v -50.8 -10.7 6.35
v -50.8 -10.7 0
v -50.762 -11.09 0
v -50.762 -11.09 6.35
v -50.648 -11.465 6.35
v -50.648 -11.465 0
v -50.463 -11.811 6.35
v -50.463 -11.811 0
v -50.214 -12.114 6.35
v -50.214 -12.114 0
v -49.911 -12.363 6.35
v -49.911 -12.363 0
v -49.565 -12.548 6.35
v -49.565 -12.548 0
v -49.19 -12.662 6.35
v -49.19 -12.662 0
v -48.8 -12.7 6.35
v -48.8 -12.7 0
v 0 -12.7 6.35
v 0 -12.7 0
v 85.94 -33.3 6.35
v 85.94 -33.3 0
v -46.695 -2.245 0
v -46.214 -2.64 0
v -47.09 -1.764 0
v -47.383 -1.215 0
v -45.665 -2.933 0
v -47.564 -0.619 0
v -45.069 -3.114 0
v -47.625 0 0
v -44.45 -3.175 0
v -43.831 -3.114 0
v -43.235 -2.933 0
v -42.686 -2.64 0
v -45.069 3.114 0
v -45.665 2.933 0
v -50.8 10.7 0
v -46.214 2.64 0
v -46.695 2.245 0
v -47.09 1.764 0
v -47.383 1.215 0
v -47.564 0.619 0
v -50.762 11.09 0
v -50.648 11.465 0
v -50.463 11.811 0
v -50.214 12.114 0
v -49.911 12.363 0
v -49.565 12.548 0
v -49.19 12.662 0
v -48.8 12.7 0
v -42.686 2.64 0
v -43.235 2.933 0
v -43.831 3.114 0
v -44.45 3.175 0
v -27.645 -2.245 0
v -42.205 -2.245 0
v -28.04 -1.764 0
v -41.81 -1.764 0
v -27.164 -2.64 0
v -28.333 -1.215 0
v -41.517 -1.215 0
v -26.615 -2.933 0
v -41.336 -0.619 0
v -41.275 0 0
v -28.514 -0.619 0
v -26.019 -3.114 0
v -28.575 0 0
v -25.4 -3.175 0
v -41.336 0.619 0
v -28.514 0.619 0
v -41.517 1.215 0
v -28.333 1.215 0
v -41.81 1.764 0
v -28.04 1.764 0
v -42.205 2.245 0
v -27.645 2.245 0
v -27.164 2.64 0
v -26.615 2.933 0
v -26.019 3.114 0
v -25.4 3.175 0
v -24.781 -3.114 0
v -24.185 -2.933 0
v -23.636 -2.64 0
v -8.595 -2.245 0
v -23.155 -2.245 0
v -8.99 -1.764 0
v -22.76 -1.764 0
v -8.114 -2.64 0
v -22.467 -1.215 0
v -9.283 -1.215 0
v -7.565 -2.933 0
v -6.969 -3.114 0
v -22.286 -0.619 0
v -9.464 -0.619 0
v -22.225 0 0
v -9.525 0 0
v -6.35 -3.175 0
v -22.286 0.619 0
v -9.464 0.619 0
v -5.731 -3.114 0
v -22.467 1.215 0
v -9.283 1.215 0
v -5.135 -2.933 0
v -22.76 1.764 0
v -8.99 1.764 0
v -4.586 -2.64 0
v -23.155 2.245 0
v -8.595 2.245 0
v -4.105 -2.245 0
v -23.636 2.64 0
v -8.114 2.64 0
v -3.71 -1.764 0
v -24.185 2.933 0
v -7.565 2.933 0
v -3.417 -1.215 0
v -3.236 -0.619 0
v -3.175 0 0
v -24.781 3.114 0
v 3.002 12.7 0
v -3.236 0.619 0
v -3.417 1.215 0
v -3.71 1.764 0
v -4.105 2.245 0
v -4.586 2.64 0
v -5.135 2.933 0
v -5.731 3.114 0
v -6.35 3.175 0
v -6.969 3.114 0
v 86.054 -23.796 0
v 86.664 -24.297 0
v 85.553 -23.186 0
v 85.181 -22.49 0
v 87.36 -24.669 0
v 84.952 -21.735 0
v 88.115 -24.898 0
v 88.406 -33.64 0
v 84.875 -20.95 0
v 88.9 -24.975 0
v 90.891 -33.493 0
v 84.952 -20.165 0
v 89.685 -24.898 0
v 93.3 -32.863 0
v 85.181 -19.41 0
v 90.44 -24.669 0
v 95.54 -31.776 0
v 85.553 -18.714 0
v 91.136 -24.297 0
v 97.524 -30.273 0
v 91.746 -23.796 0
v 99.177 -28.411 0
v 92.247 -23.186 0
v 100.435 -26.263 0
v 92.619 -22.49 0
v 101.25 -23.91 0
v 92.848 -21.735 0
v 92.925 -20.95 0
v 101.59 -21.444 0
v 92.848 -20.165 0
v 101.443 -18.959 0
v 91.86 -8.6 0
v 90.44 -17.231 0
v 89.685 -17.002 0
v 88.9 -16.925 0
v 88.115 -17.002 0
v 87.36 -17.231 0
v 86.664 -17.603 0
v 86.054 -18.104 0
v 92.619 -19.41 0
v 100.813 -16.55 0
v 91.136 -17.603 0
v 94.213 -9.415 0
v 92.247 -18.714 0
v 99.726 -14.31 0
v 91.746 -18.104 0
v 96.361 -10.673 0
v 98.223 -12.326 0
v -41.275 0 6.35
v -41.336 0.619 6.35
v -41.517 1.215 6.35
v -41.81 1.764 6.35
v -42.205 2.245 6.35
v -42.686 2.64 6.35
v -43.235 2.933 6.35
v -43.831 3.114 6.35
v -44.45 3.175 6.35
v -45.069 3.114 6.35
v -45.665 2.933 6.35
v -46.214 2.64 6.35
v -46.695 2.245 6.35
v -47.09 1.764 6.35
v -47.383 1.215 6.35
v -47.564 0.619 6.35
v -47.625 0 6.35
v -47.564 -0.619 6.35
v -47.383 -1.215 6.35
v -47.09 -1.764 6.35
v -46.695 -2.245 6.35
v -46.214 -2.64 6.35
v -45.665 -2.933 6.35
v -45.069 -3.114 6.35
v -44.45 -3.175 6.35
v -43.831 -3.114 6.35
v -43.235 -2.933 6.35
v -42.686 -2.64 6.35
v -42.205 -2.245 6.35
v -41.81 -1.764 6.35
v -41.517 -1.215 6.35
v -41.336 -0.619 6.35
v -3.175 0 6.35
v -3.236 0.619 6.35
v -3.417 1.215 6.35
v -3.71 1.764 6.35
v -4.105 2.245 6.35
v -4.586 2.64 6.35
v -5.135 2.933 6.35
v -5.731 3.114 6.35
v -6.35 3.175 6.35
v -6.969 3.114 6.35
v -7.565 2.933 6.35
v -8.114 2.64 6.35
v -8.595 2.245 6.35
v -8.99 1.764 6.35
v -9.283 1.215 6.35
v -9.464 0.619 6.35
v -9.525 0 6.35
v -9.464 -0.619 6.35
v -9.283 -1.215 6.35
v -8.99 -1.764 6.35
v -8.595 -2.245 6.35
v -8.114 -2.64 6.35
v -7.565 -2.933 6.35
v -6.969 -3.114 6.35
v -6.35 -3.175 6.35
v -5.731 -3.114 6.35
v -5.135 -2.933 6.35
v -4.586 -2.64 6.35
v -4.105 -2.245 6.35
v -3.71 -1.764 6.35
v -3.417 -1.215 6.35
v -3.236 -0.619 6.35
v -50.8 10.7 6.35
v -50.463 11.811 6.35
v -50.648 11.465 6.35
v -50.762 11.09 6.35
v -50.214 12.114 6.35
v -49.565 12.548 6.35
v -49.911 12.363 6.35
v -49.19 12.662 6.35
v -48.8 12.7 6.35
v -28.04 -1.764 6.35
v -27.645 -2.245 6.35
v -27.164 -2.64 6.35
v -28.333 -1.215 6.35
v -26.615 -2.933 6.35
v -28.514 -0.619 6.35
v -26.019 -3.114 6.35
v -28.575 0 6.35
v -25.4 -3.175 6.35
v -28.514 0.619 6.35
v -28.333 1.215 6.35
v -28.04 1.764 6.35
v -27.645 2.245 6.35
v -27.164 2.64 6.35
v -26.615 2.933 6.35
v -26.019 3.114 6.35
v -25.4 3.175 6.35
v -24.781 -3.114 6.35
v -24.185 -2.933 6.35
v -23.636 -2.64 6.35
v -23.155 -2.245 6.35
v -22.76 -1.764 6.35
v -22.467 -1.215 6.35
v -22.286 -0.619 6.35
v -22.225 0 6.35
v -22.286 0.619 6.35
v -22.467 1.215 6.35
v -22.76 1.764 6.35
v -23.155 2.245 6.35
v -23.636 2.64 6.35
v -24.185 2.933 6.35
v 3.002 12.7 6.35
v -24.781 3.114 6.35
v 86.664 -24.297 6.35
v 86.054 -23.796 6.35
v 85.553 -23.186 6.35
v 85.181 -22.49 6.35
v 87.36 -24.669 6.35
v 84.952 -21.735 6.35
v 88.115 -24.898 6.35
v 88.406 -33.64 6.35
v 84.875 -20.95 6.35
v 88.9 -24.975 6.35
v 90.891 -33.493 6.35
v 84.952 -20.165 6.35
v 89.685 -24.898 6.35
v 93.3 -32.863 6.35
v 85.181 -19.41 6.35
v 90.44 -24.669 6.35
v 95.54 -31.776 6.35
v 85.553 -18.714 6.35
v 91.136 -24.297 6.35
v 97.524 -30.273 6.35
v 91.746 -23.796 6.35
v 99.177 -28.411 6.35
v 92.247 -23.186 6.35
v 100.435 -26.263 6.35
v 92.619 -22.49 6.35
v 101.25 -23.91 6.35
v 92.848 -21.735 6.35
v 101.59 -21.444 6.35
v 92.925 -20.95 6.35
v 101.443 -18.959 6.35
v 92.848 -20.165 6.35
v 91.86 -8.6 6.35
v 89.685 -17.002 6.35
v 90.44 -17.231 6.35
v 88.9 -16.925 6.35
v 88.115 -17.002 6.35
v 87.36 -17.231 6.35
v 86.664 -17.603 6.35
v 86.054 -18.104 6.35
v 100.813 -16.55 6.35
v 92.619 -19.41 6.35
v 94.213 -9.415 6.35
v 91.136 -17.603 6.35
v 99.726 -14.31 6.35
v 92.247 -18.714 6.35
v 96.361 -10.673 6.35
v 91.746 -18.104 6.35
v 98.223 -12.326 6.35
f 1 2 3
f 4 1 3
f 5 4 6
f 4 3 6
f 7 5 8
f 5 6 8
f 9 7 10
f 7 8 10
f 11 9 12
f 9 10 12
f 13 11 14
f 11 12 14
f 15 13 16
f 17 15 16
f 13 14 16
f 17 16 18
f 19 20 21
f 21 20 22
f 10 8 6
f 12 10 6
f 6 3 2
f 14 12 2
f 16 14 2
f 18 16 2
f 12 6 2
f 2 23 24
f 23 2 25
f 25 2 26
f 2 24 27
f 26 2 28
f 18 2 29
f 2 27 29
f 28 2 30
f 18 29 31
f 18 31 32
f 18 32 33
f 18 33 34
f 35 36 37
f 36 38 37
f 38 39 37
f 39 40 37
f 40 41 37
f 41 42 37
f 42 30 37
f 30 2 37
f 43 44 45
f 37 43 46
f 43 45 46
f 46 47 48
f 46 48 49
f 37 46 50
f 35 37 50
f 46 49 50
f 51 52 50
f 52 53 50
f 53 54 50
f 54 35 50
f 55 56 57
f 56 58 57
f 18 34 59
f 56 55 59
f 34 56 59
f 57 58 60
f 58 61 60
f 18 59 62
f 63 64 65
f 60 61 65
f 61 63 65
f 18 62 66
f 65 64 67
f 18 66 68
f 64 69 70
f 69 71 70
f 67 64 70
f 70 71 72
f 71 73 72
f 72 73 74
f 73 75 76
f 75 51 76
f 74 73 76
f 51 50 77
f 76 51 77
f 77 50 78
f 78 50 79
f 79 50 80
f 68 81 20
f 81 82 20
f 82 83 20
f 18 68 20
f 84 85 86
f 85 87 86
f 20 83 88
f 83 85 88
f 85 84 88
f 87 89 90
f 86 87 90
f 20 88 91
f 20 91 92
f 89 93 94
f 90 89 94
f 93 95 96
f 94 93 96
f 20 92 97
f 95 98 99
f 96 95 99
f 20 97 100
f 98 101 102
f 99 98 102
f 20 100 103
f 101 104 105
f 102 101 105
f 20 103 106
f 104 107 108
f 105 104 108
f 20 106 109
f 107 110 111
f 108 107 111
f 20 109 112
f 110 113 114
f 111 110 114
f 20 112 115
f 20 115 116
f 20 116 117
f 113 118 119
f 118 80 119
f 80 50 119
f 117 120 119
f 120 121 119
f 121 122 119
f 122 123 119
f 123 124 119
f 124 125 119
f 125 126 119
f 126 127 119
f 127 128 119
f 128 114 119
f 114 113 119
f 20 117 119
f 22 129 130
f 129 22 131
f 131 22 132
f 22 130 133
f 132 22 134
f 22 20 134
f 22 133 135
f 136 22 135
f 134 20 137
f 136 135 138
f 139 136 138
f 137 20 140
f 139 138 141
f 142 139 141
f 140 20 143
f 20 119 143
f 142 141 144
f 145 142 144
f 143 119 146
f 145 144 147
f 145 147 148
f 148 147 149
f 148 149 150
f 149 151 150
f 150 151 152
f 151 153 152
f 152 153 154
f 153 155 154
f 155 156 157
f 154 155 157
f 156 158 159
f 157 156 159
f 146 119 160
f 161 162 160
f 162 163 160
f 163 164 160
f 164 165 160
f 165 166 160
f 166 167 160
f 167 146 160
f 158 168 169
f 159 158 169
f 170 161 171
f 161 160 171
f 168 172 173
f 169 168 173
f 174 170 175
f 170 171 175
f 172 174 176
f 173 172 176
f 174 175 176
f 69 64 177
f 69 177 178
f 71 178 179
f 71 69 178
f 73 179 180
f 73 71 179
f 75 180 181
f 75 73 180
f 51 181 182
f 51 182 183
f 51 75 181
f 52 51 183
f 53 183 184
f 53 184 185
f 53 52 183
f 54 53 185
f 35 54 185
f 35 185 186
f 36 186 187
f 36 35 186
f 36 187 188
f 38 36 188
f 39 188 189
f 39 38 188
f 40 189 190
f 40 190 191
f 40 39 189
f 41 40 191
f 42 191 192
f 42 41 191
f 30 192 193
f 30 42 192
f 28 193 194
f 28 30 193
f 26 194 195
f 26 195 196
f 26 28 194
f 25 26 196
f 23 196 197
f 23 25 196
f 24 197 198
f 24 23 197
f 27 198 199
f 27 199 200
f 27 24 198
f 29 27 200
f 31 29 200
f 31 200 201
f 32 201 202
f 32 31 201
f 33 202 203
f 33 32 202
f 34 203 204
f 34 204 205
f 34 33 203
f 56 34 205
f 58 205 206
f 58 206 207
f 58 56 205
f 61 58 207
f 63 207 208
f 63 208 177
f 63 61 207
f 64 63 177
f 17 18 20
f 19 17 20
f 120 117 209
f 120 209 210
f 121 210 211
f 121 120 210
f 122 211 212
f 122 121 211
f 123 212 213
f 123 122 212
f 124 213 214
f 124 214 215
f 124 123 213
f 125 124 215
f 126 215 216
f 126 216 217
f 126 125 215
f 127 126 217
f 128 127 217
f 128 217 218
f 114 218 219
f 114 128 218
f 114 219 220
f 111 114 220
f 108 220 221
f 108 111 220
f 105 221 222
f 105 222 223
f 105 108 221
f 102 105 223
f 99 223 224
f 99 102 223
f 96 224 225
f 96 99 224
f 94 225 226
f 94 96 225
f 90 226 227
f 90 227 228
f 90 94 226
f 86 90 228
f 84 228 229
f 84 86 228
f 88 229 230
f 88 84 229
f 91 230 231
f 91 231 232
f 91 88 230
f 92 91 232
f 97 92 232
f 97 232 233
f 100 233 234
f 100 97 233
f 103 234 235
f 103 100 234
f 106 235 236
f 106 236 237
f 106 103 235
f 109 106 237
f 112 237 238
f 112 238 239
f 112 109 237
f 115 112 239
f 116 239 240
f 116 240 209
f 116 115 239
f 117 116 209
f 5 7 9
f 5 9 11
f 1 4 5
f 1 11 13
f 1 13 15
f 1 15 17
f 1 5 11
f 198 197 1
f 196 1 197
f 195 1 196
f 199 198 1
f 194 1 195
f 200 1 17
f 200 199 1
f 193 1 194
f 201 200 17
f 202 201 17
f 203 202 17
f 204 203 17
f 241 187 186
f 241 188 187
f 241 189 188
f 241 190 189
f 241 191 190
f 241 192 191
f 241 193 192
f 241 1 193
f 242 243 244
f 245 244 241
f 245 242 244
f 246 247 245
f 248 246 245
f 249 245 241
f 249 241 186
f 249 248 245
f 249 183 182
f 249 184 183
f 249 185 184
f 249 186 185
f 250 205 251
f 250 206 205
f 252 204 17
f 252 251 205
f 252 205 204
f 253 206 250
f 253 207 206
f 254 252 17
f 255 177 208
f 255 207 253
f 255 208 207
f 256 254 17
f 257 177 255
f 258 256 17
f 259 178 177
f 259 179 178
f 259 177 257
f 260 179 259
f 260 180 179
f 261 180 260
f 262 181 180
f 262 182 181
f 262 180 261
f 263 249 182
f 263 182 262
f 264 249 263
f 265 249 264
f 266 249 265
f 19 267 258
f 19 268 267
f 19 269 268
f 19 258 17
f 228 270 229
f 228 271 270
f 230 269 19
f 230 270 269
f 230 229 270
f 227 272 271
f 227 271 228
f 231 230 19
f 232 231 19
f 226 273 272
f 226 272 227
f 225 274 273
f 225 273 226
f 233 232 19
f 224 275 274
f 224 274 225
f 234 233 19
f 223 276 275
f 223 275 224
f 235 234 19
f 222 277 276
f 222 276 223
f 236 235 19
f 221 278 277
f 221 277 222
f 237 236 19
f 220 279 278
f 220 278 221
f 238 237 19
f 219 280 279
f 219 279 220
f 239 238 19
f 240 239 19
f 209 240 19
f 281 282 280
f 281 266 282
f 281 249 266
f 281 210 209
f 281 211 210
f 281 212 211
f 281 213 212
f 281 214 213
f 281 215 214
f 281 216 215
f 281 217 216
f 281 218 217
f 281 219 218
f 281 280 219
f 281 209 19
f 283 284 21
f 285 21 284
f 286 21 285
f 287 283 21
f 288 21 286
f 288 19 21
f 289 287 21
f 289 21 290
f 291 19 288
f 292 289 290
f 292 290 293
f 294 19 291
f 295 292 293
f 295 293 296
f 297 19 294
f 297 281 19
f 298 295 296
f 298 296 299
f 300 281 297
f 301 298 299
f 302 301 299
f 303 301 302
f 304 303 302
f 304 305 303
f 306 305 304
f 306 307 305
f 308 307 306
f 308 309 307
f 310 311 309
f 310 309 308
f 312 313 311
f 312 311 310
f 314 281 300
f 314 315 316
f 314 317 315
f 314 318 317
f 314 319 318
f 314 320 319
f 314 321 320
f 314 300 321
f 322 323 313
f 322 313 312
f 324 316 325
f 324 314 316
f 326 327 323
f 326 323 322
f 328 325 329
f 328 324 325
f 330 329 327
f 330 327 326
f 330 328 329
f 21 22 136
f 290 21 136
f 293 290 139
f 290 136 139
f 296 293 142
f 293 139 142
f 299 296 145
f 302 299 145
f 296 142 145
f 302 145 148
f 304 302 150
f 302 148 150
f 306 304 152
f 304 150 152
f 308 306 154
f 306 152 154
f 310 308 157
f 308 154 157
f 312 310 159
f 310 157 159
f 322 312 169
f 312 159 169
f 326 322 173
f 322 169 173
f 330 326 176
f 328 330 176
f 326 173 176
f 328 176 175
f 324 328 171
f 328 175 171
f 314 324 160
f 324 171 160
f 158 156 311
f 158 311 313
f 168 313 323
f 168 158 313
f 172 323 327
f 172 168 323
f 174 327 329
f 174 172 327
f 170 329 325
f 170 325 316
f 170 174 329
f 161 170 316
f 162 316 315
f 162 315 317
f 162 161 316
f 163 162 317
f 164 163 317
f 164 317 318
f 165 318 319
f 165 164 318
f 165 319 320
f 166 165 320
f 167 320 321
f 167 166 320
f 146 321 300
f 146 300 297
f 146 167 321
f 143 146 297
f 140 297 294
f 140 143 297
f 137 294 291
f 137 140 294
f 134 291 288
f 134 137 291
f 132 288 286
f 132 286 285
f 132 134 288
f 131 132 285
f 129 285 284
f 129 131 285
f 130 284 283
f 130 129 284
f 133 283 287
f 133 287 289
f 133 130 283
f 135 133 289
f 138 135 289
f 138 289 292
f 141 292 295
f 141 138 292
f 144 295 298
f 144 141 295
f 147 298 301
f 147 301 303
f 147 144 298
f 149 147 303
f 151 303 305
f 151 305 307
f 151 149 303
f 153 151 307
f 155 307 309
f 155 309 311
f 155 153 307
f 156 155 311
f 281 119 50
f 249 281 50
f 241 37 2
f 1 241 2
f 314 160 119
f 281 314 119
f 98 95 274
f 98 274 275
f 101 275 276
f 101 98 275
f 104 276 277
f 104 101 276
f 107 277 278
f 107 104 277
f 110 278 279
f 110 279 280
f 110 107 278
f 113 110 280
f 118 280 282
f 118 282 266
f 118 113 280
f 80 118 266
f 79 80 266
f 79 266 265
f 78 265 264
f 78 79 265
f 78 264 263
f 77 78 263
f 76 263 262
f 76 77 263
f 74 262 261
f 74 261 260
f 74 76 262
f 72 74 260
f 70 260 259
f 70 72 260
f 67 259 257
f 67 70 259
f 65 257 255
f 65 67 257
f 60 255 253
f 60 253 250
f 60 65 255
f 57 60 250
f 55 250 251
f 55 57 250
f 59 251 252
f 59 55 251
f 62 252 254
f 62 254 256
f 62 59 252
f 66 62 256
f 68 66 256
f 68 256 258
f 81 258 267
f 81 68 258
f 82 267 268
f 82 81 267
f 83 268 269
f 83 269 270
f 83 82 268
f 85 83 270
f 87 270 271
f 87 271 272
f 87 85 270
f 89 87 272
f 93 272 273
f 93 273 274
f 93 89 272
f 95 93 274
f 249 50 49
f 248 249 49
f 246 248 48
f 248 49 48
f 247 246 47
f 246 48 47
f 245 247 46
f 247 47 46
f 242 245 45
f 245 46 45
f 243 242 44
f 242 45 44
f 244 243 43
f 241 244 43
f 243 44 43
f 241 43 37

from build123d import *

# Parameters (mm, degrees)
SKETCH1_R           = 3.175
SKETCH1_R_2         = 4.025
BOSS_EXTRUDE1_DEPTH = 6.35


with BuildPart() as part:
    # Sketch1 → Boss-Extrude1 (new body)
    with BuildSketch(Plane.XY):
        with BuildLine():
            Line((91.860390313, -8.599854689), (3.001735639, 12.7))
            Line((3.001735639, 12.7), (-48.8, 12.7))
            ThreePointArc((-48.8, 12.7), (-50.214213562, 12.114213562), (-50.8, 10.7))
            Line((-50.8, 10.7), (-50.8, -10.7))
            ThreePointArc((-50.8, -10.7), (-50.214213562, -12.114213562), (-48.8, -12.7))
            Line((-48.8, -12.7), (0, -12.7))
            Line((0, -12.7), (85.939609687, -33.300145311))
            ThreePointArc((85.939609687, -33.300145311), (101.250145311, -23.910390313), (91.860390313, -8.599854689))
        make_face()
        with Locations((-25.4, 0)):
            Circle(SKETCH1_R, mode=Mode.SUBTRACT)
        with Locations((88.9, -20.95)):
            Circle(SKETCH1_R_2, mode=Mode.SUBTRACT)
        with Locations((-44.45, 0)):
            Circle(SKETCH1_R, mode=Mode.SUBTRACT)
        with Locations((-6.35, 0)):
            Circle(SKETCH1_R, mode=Mode.SUBTRACT)
    extrude(amount=BOSS_EXTRUDE1_DEPTH)


solid = part.part
